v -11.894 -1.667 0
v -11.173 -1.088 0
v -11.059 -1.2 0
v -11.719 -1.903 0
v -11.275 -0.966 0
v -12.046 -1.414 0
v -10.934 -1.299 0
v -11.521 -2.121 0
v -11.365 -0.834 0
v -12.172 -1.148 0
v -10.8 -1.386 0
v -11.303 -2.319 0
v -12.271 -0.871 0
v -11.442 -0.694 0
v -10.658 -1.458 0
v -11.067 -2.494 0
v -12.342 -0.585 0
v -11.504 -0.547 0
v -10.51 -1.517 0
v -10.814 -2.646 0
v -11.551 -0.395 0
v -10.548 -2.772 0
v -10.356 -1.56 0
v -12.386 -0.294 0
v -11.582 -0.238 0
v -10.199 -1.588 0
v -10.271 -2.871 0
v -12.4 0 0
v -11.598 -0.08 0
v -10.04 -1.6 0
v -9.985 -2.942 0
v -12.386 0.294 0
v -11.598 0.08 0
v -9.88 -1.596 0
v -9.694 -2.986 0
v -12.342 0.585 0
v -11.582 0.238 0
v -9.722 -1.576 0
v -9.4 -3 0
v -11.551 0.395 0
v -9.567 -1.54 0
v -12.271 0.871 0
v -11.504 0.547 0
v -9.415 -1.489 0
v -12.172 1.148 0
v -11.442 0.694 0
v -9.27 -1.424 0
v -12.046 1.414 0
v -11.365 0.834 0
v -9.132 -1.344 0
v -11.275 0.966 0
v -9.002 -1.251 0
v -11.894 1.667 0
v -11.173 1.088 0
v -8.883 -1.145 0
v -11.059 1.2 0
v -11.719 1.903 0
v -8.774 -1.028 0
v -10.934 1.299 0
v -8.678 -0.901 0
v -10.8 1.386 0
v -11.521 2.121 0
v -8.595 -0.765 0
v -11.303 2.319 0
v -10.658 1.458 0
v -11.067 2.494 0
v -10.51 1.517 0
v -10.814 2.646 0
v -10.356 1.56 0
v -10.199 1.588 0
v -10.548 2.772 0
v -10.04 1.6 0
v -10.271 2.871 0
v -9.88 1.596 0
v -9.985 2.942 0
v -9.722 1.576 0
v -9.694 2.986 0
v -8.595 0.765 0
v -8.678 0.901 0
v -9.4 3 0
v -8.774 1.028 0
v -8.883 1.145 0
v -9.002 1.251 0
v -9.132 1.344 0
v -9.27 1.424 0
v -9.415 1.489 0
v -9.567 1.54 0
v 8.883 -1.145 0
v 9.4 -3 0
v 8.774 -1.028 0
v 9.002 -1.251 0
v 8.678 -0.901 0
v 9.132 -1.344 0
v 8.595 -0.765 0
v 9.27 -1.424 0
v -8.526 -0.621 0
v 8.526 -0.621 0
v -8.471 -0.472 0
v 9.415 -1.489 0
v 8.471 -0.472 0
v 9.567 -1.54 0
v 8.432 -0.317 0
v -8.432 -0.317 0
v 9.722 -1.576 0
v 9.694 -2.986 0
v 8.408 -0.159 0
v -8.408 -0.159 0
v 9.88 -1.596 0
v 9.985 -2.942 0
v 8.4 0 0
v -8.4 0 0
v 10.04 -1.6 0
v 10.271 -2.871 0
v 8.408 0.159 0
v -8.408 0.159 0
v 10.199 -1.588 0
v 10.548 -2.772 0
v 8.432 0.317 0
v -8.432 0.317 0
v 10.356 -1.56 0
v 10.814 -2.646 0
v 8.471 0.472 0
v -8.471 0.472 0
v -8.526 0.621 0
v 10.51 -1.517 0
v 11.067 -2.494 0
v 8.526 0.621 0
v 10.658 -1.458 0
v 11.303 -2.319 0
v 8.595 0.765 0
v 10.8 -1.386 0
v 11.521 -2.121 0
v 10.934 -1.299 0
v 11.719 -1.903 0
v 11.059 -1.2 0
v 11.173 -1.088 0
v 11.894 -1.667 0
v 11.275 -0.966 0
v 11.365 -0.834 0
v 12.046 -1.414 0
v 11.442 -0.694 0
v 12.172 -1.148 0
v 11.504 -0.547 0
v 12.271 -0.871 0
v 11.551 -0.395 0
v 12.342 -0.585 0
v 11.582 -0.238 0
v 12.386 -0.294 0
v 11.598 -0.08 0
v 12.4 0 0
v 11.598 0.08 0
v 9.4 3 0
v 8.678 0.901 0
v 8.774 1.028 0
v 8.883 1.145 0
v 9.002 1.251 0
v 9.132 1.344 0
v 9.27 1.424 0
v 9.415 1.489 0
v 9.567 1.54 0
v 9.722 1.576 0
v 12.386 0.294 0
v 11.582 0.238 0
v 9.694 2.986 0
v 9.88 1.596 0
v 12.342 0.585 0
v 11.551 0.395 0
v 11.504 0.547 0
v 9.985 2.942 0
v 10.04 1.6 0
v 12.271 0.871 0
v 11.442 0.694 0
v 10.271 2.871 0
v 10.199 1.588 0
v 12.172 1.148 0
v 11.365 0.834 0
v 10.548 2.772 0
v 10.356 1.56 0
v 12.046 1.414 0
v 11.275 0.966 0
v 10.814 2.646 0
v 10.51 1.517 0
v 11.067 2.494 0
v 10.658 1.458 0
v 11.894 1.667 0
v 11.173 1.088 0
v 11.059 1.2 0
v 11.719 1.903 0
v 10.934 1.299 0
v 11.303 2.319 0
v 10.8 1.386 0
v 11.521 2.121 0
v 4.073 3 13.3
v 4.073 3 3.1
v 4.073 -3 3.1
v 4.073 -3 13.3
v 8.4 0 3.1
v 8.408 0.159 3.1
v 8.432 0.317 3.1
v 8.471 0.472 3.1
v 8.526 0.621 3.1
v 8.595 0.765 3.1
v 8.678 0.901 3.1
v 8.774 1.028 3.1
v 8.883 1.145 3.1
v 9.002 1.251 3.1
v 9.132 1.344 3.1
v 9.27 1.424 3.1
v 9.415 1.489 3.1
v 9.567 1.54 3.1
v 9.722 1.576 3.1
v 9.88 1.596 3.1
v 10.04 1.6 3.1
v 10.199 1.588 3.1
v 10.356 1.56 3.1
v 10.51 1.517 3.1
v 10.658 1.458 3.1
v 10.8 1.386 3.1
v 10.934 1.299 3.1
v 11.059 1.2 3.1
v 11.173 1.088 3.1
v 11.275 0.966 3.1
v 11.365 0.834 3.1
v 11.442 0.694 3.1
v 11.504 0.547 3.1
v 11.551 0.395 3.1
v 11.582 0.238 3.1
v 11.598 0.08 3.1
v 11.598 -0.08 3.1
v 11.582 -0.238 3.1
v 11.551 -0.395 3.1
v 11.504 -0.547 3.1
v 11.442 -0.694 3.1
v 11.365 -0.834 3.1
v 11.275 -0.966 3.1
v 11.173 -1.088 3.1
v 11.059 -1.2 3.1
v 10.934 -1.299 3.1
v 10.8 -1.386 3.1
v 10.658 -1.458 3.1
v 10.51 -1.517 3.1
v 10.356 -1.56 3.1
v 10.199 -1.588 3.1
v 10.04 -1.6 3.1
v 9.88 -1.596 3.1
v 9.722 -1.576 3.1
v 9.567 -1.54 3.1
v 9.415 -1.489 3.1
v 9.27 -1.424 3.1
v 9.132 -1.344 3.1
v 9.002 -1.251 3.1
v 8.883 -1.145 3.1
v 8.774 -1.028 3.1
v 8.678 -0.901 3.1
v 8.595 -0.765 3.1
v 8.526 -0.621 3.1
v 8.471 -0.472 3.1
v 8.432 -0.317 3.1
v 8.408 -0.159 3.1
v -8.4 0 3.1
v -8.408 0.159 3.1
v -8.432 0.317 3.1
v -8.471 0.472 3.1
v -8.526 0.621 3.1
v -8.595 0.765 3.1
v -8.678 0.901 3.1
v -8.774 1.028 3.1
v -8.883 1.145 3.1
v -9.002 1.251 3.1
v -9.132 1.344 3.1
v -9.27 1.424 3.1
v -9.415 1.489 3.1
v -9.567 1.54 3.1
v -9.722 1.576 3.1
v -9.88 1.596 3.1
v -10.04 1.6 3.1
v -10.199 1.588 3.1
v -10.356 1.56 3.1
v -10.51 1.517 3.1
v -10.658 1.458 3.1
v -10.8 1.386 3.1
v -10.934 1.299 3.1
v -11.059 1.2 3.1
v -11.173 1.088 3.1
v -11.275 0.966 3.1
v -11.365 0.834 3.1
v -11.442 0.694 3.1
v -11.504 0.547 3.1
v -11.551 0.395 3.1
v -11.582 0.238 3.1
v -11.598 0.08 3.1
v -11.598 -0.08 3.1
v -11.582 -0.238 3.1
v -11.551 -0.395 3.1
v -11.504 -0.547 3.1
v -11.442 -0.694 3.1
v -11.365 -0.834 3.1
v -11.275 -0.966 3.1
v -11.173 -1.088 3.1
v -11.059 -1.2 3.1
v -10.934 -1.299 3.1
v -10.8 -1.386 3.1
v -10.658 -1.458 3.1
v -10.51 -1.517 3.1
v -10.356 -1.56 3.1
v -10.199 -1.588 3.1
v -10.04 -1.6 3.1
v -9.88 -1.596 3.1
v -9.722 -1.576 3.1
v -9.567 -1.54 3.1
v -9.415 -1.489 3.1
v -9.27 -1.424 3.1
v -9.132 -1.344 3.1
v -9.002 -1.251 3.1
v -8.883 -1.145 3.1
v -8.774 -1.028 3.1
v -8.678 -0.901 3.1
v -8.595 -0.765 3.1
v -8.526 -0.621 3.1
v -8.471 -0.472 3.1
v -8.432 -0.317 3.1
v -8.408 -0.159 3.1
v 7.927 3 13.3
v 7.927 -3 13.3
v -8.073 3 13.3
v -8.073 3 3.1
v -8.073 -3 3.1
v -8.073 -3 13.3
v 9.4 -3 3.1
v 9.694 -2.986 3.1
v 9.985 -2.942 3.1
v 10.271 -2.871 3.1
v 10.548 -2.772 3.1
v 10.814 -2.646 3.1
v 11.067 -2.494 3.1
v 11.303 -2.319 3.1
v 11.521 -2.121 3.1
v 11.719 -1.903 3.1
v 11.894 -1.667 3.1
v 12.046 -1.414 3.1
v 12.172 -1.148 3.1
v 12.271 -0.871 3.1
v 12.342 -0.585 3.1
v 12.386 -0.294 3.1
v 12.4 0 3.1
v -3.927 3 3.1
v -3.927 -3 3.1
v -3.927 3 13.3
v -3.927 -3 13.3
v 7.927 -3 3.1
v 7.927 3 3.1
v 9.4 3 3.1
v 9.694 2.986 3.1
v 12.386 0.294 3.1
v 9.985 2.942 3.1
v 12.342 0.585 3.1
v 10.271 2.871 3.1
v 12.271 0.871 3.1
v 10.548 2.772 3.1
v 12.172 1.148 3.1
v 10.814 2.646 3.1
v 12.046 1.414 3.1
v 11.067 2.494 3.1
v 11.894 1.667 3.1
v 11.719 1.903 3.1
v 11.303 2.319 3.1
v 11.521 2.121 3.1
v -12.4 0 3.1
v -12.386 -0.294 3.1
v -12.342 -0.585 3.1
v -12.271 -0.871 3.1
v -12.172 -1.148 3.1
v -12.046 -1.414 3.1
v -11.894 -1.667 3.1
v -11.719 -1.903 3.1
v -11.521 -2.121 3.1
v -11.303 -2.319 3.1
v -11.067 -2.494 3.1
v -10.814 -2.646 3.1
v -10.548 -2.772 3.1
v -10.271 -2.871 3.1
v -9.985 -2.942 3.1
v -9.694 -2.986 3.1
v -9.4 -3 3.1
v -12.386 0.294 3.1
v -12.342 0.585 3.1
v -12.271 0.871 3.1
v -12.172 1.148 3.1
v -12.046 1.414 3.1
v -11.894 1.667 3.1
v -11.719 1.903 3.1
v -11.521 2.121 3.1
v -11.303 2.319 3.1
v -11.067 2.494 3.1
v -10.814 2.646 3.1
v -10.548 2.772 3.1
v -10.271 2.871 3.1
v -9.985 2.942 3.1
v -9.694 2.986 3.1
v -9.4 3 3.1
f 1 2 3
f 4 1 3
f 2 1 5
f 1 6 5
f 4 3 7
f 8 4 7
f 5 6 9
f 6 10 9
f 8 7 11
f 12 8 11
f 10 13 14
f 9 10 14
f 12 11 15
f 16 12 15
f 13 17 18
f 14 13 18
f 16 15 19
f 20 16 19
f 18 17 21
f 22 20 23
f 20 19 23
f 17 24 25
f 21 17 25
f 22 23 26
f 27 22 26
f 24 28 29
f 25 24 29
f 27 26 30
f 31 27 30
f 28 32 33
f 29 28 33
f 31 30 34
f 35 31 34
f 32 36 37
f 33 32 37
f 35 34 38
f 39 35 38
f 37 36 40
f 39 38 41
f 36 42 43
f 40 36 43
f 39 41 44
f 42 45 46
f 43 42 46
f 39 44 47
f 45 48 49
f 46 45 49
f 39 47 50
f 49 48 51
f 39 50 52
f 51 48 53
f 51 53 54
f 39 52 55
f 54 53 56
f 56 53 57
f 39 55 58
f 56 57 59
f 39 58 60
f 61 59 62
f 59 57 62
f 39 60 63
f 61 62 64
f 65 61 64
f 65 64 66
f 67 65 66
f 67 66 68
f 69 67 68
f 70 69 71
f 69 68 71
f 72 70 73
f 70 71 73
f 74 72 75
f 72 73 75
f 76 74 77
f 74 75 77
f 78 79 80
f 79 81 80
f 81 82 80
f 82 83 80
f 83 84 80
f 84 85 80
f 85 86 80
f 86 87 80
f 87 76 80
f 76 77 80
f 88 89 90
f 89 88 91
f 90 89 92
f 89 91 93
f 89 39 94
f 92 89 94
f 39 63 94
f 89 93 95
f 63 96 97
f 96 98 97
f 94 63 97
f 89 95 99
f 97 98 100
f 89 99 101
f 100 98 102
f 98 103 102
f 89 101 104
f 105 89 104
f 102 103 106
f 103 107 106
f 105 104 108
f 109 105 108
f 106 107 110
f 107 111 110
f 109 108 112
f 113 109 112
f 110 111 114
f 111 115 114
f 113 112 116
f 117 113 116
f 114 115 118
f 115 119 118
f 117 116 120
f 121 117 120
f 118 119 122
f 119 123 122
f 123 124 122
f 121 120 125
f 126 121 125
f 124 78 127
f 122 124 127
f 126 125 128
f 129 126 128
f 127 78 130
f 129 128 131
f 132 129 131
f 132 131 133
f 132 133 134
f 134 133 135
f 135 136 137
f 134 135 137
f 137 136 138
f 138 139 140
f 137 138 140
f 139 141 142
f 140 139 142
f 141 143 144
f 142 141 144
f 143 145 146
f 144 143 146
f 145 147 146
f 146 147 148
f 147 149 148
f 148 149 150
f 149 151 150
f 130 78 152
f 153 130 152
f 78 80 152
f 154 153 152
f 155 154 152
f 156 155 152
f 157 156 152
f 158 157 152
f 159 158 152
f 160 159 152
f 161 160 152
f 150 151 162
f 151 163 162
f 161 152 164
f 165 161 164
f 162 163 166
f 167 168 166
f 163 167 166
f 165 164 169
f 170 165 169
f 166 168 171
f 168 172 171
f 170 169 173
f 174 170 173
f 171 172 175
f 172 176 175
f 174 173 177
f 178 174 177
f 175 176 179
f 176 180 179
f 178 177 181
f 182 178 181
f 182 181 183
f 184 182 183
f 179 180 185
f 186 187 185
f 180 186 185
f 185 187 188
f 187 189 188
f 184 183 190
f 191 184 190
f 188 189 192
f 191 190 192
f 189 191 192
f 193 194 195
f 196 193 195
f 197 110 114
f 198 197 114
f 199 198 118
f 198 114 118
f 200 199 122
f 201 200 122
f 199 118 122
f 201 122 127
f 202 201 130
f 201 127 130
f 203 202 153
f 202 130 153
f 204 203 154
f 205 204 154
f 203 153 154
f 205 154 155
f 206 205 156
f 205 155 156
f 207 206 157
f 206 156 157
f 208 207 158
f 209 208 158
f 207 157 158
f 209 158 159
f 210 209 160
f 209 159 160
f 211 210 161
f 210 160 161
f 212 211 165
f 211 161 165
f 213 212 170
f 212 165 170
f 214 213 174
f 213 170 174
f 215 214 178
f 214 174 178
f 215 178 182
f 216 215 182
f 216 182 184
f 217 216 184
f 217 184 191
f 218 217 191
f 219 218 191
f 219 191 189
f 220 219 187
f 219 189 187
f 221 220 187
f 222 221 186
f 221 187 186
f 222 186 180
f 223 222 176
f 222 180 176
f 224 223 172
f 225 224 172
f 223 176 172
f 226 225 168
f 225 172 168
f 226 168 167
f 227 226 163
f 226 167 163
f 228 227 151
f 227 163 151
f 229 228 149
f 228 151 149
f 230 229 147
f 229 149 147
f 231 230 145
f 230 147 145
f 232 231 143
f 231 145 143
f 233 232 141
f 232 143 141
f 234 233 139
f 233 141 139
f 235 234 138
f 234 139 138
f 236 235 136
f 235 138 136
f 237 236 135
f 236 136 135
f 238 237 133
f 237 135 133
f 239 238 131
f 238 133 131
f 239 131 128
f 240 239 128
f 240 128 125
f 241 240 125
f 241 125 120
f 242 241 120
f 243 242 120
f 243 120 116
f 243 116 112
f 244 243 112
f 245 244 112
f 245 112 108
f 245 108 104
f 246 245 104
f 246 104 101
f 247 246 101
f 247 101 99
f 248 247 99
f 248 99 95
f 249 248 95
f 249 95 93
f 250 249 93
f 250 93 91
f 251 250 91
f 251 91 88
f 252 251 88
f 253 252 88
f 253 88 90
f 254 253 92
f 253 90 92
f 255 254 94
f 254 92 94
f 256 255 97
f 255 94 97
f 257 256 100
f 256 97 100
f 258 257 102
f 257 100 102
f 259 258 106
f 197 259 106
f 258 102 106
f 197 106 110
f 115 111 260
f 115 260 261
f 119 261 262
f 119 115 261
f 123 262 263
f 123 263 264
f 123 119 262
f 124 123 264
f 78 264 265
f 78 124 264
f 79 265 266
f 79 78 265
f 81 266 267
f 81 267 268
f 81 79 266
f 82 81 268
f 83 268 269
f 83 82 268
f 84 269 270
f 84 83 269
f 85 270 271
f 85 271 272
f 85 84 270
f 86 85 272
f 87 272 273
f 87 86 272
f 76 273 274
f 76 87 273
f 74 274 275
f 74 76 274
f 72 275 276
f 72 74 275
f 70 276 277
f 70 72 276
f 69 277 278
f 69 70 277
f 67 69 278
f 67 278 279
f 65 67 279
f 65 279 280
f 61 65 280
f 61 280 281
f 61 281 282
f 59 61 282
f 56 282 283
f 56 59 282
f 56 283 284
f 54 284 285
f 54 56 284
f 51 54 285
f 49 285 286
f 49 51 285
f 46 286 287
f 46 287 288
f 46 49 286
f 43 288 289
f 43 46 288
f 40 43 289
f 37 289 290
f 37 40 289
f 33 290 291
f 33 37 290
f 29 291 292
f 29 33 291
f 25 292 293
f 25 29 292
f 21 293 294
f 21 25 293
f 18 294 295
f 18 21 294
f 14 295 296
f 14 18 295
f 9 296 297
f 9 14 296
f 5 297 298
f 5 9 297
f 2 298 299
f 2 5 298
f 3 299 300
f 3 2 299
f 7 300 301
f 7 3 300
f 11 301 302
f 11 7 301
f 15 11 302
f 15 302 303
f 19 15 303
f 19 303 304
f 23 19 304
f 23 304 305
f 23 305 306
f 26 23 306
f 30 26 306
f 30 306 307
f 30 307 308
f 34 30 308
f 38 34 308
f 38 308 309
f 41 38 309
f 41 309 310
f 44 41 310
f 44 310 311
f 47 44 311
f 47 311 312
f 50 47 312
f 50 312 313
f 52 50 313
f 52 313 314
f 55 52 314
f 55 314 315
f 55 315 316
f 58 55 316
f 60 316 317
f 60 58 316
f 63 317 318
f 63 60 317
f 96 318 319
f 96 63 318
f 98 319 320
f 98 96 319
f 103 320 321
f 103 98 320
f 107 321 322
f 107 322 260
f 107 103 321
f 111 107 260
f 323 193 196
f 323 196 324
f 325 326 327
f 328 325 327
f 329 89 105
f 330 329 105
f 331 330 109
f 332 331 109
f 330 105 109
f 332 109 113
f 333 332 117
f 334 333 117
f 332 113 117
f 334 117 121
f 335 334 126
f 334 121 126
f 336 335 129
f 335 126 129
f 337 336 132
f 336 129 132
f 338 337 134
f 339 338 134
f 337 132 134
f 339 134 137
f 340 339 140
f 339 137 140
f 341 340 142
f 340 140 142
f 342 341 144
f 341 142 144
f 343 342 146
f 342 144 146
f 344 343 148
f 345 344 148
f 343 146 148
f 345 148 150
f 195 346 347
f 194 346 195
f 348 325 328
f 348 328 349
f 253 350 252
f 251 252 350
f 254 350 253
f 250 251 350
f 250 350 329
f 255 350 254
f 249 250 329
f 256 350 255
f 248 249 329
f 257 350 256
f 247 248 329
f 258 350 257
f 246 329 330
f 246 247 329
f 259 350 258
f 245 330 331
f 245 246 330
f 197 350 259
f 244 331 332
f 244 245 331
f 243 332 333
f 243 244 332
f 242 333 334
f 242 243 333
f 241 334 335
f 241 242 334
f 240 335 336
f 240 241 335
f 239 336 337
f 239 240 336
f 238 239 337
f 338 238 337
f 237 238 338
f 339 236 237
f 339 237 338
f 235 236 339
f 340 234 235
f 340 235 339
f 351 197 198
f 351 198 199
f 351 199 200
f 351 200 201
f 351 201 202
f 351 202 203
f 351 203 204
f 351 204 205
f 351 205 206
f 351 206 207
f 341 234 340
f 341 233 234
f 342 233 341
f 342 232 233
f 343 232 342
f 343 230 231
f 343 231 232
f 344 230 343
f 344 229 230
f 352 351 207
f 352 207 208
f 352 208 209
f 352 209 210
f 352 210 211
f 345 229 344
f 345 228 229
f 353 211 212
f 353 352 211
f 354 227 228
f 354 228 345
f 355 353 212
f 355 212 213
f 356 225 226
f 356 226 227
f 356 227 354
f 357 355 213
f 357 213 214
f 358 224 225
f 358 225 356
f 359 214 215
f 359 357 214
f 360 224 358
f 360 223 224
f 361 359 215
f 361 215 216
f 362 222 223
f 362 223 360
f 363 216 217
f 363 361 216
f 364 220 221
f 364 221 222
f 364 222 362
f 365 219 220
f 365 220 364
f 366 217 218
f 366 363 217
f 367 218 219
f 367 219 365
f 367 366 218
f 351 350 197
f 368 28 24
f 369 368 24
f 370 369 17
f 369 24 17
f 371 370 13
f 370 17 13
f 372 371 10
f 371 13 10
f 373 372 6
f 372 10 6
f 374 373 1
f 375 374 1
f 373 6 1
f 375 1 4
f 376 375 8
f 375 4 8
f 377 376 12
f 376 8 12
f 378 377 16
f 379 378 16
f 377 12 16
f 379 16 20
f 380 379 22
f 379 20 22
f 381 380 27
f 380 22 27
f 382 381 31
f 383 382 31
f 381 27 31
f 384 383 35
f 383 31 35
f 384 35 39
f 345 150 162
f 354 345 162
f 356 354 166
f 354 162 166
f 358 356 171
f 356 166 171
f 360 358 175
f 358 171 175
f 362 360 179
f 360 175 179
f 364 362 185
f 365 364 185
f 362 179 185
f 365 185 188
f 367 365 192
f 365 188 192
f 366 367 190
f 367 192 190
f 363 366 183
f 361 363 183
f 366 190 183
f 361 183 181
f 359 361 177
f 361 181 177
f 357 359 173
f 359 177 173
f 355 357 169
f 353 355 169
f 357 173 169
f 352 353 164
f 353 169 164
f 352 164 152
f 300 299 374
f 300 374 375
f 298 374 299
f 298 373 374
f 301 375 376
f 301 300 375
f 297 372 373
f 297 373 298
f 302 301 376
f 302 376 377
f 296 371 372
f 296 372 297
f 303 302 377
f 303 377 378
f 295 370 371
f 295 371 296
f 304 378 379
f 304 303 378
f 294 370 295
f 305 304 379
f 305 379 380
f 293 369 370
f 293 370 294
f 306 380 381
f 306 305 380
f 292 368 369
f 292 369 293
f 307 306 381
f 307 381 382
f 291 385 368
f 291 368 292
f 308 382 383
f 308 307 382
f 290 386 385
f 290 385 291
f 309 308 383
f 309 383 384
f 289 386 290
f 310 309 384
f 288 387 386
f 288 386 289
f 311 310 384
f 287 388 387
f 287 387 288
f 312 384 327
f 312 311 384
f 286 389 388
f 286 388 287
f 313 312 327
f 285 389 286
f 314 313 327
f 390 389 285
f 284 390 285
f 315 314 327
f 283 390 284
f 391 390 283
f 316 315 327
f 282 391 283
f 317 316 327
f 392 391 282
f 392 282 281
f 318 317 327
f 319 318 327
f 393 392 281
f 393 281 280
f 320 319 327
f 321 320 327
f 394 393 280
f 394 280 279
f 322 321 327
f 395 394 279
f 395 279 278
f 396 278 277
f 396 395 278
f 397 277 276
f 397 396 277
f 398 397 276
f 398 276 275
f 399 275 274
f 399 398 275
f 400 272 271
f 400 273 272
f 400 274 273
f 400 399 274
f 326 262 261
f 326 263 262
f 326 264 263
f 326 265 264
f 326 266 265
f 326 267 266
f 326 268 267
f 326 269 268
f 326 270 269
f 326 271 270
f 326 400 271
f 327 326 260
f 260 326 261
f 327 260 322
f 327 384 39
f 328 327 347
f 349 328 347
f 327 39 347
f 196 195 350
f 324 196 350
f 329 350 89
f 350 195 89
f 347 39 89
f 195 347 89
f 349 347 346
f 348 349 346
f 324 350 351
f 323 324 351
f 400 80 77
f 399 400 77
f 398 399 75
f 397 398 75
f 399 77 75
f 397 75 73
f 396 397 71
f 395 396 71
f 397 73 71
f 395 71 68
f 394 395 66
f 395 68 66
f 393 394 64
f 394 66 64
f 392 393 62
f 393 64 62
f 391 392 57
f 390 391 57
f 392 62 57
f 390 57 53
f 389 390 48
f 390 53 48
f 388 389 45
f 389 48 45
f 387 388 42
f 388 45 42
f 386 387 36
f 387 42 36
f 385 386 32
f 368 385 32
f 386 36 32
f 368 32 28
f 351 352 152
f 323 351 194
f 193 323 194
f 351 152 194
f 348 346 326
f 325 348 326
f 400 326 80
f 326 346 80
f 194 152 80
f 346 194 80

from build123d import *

# Parameters (mm, degrees)
F0_R     = 1.6
F1_DEPTH = 3.1
F3_DEPTH = 10.2


with BuildPart() as f1:
    # F0 (on Top) → F1 (new body)
    with BuildSketch(Plane.XY):
        with BuildLine():
            ThreePointArc((12.4, 0), (11.5213203436, 2.1213203436), (9.4, 3))
            Line((9.4, 3), (-9.4, 3))
            ThreePointArc((-9.4, 3), (-11.5213203436, 2.1213203436), (-12.4, 0))
            ThreePointArc((-12.4, 0), (-11.5213203436, -2.1213203436), (-9.4, -3))
            Line((-9.4, -3), (9.4, -3))
            ThreePointArc((9.4, -3), (11.5213203436, -2.1213203436), (12.4, 0))
        make_face()
        with Locations((-10, 0)):
            Circle(F0_R, mode=Mode.SUBTRACT)
        with BuildLine():
            ThreePointArc((11.6, 0), (10, -1.6), (8.4, 0))
            ThreePointArc((8.4, 0), (10, 1.6), (11.6, 0))
        make_face(mode=Mode.SUBTRACT)
    extrude(amount=F1_DEPTH)

    # F2 (on face) → F3 (join)
    with BuildSketch(Plane.XY.offset(3.1)):
        Polygon((-3.9267988071, -3), (-3.9267988071, 0), (-3.9267988071, 3), (-8.0732011929, 3), (-8.0732011929, -3), align=None)
        Polygon((4.0732011929, 3), (4.0732011929, 0), (4.0732011929, -3), (7.9267988071, -3), (7.9267988071, 3), align=None)
    extrude(amount=F3_DEPTH)


solid = f1.part
